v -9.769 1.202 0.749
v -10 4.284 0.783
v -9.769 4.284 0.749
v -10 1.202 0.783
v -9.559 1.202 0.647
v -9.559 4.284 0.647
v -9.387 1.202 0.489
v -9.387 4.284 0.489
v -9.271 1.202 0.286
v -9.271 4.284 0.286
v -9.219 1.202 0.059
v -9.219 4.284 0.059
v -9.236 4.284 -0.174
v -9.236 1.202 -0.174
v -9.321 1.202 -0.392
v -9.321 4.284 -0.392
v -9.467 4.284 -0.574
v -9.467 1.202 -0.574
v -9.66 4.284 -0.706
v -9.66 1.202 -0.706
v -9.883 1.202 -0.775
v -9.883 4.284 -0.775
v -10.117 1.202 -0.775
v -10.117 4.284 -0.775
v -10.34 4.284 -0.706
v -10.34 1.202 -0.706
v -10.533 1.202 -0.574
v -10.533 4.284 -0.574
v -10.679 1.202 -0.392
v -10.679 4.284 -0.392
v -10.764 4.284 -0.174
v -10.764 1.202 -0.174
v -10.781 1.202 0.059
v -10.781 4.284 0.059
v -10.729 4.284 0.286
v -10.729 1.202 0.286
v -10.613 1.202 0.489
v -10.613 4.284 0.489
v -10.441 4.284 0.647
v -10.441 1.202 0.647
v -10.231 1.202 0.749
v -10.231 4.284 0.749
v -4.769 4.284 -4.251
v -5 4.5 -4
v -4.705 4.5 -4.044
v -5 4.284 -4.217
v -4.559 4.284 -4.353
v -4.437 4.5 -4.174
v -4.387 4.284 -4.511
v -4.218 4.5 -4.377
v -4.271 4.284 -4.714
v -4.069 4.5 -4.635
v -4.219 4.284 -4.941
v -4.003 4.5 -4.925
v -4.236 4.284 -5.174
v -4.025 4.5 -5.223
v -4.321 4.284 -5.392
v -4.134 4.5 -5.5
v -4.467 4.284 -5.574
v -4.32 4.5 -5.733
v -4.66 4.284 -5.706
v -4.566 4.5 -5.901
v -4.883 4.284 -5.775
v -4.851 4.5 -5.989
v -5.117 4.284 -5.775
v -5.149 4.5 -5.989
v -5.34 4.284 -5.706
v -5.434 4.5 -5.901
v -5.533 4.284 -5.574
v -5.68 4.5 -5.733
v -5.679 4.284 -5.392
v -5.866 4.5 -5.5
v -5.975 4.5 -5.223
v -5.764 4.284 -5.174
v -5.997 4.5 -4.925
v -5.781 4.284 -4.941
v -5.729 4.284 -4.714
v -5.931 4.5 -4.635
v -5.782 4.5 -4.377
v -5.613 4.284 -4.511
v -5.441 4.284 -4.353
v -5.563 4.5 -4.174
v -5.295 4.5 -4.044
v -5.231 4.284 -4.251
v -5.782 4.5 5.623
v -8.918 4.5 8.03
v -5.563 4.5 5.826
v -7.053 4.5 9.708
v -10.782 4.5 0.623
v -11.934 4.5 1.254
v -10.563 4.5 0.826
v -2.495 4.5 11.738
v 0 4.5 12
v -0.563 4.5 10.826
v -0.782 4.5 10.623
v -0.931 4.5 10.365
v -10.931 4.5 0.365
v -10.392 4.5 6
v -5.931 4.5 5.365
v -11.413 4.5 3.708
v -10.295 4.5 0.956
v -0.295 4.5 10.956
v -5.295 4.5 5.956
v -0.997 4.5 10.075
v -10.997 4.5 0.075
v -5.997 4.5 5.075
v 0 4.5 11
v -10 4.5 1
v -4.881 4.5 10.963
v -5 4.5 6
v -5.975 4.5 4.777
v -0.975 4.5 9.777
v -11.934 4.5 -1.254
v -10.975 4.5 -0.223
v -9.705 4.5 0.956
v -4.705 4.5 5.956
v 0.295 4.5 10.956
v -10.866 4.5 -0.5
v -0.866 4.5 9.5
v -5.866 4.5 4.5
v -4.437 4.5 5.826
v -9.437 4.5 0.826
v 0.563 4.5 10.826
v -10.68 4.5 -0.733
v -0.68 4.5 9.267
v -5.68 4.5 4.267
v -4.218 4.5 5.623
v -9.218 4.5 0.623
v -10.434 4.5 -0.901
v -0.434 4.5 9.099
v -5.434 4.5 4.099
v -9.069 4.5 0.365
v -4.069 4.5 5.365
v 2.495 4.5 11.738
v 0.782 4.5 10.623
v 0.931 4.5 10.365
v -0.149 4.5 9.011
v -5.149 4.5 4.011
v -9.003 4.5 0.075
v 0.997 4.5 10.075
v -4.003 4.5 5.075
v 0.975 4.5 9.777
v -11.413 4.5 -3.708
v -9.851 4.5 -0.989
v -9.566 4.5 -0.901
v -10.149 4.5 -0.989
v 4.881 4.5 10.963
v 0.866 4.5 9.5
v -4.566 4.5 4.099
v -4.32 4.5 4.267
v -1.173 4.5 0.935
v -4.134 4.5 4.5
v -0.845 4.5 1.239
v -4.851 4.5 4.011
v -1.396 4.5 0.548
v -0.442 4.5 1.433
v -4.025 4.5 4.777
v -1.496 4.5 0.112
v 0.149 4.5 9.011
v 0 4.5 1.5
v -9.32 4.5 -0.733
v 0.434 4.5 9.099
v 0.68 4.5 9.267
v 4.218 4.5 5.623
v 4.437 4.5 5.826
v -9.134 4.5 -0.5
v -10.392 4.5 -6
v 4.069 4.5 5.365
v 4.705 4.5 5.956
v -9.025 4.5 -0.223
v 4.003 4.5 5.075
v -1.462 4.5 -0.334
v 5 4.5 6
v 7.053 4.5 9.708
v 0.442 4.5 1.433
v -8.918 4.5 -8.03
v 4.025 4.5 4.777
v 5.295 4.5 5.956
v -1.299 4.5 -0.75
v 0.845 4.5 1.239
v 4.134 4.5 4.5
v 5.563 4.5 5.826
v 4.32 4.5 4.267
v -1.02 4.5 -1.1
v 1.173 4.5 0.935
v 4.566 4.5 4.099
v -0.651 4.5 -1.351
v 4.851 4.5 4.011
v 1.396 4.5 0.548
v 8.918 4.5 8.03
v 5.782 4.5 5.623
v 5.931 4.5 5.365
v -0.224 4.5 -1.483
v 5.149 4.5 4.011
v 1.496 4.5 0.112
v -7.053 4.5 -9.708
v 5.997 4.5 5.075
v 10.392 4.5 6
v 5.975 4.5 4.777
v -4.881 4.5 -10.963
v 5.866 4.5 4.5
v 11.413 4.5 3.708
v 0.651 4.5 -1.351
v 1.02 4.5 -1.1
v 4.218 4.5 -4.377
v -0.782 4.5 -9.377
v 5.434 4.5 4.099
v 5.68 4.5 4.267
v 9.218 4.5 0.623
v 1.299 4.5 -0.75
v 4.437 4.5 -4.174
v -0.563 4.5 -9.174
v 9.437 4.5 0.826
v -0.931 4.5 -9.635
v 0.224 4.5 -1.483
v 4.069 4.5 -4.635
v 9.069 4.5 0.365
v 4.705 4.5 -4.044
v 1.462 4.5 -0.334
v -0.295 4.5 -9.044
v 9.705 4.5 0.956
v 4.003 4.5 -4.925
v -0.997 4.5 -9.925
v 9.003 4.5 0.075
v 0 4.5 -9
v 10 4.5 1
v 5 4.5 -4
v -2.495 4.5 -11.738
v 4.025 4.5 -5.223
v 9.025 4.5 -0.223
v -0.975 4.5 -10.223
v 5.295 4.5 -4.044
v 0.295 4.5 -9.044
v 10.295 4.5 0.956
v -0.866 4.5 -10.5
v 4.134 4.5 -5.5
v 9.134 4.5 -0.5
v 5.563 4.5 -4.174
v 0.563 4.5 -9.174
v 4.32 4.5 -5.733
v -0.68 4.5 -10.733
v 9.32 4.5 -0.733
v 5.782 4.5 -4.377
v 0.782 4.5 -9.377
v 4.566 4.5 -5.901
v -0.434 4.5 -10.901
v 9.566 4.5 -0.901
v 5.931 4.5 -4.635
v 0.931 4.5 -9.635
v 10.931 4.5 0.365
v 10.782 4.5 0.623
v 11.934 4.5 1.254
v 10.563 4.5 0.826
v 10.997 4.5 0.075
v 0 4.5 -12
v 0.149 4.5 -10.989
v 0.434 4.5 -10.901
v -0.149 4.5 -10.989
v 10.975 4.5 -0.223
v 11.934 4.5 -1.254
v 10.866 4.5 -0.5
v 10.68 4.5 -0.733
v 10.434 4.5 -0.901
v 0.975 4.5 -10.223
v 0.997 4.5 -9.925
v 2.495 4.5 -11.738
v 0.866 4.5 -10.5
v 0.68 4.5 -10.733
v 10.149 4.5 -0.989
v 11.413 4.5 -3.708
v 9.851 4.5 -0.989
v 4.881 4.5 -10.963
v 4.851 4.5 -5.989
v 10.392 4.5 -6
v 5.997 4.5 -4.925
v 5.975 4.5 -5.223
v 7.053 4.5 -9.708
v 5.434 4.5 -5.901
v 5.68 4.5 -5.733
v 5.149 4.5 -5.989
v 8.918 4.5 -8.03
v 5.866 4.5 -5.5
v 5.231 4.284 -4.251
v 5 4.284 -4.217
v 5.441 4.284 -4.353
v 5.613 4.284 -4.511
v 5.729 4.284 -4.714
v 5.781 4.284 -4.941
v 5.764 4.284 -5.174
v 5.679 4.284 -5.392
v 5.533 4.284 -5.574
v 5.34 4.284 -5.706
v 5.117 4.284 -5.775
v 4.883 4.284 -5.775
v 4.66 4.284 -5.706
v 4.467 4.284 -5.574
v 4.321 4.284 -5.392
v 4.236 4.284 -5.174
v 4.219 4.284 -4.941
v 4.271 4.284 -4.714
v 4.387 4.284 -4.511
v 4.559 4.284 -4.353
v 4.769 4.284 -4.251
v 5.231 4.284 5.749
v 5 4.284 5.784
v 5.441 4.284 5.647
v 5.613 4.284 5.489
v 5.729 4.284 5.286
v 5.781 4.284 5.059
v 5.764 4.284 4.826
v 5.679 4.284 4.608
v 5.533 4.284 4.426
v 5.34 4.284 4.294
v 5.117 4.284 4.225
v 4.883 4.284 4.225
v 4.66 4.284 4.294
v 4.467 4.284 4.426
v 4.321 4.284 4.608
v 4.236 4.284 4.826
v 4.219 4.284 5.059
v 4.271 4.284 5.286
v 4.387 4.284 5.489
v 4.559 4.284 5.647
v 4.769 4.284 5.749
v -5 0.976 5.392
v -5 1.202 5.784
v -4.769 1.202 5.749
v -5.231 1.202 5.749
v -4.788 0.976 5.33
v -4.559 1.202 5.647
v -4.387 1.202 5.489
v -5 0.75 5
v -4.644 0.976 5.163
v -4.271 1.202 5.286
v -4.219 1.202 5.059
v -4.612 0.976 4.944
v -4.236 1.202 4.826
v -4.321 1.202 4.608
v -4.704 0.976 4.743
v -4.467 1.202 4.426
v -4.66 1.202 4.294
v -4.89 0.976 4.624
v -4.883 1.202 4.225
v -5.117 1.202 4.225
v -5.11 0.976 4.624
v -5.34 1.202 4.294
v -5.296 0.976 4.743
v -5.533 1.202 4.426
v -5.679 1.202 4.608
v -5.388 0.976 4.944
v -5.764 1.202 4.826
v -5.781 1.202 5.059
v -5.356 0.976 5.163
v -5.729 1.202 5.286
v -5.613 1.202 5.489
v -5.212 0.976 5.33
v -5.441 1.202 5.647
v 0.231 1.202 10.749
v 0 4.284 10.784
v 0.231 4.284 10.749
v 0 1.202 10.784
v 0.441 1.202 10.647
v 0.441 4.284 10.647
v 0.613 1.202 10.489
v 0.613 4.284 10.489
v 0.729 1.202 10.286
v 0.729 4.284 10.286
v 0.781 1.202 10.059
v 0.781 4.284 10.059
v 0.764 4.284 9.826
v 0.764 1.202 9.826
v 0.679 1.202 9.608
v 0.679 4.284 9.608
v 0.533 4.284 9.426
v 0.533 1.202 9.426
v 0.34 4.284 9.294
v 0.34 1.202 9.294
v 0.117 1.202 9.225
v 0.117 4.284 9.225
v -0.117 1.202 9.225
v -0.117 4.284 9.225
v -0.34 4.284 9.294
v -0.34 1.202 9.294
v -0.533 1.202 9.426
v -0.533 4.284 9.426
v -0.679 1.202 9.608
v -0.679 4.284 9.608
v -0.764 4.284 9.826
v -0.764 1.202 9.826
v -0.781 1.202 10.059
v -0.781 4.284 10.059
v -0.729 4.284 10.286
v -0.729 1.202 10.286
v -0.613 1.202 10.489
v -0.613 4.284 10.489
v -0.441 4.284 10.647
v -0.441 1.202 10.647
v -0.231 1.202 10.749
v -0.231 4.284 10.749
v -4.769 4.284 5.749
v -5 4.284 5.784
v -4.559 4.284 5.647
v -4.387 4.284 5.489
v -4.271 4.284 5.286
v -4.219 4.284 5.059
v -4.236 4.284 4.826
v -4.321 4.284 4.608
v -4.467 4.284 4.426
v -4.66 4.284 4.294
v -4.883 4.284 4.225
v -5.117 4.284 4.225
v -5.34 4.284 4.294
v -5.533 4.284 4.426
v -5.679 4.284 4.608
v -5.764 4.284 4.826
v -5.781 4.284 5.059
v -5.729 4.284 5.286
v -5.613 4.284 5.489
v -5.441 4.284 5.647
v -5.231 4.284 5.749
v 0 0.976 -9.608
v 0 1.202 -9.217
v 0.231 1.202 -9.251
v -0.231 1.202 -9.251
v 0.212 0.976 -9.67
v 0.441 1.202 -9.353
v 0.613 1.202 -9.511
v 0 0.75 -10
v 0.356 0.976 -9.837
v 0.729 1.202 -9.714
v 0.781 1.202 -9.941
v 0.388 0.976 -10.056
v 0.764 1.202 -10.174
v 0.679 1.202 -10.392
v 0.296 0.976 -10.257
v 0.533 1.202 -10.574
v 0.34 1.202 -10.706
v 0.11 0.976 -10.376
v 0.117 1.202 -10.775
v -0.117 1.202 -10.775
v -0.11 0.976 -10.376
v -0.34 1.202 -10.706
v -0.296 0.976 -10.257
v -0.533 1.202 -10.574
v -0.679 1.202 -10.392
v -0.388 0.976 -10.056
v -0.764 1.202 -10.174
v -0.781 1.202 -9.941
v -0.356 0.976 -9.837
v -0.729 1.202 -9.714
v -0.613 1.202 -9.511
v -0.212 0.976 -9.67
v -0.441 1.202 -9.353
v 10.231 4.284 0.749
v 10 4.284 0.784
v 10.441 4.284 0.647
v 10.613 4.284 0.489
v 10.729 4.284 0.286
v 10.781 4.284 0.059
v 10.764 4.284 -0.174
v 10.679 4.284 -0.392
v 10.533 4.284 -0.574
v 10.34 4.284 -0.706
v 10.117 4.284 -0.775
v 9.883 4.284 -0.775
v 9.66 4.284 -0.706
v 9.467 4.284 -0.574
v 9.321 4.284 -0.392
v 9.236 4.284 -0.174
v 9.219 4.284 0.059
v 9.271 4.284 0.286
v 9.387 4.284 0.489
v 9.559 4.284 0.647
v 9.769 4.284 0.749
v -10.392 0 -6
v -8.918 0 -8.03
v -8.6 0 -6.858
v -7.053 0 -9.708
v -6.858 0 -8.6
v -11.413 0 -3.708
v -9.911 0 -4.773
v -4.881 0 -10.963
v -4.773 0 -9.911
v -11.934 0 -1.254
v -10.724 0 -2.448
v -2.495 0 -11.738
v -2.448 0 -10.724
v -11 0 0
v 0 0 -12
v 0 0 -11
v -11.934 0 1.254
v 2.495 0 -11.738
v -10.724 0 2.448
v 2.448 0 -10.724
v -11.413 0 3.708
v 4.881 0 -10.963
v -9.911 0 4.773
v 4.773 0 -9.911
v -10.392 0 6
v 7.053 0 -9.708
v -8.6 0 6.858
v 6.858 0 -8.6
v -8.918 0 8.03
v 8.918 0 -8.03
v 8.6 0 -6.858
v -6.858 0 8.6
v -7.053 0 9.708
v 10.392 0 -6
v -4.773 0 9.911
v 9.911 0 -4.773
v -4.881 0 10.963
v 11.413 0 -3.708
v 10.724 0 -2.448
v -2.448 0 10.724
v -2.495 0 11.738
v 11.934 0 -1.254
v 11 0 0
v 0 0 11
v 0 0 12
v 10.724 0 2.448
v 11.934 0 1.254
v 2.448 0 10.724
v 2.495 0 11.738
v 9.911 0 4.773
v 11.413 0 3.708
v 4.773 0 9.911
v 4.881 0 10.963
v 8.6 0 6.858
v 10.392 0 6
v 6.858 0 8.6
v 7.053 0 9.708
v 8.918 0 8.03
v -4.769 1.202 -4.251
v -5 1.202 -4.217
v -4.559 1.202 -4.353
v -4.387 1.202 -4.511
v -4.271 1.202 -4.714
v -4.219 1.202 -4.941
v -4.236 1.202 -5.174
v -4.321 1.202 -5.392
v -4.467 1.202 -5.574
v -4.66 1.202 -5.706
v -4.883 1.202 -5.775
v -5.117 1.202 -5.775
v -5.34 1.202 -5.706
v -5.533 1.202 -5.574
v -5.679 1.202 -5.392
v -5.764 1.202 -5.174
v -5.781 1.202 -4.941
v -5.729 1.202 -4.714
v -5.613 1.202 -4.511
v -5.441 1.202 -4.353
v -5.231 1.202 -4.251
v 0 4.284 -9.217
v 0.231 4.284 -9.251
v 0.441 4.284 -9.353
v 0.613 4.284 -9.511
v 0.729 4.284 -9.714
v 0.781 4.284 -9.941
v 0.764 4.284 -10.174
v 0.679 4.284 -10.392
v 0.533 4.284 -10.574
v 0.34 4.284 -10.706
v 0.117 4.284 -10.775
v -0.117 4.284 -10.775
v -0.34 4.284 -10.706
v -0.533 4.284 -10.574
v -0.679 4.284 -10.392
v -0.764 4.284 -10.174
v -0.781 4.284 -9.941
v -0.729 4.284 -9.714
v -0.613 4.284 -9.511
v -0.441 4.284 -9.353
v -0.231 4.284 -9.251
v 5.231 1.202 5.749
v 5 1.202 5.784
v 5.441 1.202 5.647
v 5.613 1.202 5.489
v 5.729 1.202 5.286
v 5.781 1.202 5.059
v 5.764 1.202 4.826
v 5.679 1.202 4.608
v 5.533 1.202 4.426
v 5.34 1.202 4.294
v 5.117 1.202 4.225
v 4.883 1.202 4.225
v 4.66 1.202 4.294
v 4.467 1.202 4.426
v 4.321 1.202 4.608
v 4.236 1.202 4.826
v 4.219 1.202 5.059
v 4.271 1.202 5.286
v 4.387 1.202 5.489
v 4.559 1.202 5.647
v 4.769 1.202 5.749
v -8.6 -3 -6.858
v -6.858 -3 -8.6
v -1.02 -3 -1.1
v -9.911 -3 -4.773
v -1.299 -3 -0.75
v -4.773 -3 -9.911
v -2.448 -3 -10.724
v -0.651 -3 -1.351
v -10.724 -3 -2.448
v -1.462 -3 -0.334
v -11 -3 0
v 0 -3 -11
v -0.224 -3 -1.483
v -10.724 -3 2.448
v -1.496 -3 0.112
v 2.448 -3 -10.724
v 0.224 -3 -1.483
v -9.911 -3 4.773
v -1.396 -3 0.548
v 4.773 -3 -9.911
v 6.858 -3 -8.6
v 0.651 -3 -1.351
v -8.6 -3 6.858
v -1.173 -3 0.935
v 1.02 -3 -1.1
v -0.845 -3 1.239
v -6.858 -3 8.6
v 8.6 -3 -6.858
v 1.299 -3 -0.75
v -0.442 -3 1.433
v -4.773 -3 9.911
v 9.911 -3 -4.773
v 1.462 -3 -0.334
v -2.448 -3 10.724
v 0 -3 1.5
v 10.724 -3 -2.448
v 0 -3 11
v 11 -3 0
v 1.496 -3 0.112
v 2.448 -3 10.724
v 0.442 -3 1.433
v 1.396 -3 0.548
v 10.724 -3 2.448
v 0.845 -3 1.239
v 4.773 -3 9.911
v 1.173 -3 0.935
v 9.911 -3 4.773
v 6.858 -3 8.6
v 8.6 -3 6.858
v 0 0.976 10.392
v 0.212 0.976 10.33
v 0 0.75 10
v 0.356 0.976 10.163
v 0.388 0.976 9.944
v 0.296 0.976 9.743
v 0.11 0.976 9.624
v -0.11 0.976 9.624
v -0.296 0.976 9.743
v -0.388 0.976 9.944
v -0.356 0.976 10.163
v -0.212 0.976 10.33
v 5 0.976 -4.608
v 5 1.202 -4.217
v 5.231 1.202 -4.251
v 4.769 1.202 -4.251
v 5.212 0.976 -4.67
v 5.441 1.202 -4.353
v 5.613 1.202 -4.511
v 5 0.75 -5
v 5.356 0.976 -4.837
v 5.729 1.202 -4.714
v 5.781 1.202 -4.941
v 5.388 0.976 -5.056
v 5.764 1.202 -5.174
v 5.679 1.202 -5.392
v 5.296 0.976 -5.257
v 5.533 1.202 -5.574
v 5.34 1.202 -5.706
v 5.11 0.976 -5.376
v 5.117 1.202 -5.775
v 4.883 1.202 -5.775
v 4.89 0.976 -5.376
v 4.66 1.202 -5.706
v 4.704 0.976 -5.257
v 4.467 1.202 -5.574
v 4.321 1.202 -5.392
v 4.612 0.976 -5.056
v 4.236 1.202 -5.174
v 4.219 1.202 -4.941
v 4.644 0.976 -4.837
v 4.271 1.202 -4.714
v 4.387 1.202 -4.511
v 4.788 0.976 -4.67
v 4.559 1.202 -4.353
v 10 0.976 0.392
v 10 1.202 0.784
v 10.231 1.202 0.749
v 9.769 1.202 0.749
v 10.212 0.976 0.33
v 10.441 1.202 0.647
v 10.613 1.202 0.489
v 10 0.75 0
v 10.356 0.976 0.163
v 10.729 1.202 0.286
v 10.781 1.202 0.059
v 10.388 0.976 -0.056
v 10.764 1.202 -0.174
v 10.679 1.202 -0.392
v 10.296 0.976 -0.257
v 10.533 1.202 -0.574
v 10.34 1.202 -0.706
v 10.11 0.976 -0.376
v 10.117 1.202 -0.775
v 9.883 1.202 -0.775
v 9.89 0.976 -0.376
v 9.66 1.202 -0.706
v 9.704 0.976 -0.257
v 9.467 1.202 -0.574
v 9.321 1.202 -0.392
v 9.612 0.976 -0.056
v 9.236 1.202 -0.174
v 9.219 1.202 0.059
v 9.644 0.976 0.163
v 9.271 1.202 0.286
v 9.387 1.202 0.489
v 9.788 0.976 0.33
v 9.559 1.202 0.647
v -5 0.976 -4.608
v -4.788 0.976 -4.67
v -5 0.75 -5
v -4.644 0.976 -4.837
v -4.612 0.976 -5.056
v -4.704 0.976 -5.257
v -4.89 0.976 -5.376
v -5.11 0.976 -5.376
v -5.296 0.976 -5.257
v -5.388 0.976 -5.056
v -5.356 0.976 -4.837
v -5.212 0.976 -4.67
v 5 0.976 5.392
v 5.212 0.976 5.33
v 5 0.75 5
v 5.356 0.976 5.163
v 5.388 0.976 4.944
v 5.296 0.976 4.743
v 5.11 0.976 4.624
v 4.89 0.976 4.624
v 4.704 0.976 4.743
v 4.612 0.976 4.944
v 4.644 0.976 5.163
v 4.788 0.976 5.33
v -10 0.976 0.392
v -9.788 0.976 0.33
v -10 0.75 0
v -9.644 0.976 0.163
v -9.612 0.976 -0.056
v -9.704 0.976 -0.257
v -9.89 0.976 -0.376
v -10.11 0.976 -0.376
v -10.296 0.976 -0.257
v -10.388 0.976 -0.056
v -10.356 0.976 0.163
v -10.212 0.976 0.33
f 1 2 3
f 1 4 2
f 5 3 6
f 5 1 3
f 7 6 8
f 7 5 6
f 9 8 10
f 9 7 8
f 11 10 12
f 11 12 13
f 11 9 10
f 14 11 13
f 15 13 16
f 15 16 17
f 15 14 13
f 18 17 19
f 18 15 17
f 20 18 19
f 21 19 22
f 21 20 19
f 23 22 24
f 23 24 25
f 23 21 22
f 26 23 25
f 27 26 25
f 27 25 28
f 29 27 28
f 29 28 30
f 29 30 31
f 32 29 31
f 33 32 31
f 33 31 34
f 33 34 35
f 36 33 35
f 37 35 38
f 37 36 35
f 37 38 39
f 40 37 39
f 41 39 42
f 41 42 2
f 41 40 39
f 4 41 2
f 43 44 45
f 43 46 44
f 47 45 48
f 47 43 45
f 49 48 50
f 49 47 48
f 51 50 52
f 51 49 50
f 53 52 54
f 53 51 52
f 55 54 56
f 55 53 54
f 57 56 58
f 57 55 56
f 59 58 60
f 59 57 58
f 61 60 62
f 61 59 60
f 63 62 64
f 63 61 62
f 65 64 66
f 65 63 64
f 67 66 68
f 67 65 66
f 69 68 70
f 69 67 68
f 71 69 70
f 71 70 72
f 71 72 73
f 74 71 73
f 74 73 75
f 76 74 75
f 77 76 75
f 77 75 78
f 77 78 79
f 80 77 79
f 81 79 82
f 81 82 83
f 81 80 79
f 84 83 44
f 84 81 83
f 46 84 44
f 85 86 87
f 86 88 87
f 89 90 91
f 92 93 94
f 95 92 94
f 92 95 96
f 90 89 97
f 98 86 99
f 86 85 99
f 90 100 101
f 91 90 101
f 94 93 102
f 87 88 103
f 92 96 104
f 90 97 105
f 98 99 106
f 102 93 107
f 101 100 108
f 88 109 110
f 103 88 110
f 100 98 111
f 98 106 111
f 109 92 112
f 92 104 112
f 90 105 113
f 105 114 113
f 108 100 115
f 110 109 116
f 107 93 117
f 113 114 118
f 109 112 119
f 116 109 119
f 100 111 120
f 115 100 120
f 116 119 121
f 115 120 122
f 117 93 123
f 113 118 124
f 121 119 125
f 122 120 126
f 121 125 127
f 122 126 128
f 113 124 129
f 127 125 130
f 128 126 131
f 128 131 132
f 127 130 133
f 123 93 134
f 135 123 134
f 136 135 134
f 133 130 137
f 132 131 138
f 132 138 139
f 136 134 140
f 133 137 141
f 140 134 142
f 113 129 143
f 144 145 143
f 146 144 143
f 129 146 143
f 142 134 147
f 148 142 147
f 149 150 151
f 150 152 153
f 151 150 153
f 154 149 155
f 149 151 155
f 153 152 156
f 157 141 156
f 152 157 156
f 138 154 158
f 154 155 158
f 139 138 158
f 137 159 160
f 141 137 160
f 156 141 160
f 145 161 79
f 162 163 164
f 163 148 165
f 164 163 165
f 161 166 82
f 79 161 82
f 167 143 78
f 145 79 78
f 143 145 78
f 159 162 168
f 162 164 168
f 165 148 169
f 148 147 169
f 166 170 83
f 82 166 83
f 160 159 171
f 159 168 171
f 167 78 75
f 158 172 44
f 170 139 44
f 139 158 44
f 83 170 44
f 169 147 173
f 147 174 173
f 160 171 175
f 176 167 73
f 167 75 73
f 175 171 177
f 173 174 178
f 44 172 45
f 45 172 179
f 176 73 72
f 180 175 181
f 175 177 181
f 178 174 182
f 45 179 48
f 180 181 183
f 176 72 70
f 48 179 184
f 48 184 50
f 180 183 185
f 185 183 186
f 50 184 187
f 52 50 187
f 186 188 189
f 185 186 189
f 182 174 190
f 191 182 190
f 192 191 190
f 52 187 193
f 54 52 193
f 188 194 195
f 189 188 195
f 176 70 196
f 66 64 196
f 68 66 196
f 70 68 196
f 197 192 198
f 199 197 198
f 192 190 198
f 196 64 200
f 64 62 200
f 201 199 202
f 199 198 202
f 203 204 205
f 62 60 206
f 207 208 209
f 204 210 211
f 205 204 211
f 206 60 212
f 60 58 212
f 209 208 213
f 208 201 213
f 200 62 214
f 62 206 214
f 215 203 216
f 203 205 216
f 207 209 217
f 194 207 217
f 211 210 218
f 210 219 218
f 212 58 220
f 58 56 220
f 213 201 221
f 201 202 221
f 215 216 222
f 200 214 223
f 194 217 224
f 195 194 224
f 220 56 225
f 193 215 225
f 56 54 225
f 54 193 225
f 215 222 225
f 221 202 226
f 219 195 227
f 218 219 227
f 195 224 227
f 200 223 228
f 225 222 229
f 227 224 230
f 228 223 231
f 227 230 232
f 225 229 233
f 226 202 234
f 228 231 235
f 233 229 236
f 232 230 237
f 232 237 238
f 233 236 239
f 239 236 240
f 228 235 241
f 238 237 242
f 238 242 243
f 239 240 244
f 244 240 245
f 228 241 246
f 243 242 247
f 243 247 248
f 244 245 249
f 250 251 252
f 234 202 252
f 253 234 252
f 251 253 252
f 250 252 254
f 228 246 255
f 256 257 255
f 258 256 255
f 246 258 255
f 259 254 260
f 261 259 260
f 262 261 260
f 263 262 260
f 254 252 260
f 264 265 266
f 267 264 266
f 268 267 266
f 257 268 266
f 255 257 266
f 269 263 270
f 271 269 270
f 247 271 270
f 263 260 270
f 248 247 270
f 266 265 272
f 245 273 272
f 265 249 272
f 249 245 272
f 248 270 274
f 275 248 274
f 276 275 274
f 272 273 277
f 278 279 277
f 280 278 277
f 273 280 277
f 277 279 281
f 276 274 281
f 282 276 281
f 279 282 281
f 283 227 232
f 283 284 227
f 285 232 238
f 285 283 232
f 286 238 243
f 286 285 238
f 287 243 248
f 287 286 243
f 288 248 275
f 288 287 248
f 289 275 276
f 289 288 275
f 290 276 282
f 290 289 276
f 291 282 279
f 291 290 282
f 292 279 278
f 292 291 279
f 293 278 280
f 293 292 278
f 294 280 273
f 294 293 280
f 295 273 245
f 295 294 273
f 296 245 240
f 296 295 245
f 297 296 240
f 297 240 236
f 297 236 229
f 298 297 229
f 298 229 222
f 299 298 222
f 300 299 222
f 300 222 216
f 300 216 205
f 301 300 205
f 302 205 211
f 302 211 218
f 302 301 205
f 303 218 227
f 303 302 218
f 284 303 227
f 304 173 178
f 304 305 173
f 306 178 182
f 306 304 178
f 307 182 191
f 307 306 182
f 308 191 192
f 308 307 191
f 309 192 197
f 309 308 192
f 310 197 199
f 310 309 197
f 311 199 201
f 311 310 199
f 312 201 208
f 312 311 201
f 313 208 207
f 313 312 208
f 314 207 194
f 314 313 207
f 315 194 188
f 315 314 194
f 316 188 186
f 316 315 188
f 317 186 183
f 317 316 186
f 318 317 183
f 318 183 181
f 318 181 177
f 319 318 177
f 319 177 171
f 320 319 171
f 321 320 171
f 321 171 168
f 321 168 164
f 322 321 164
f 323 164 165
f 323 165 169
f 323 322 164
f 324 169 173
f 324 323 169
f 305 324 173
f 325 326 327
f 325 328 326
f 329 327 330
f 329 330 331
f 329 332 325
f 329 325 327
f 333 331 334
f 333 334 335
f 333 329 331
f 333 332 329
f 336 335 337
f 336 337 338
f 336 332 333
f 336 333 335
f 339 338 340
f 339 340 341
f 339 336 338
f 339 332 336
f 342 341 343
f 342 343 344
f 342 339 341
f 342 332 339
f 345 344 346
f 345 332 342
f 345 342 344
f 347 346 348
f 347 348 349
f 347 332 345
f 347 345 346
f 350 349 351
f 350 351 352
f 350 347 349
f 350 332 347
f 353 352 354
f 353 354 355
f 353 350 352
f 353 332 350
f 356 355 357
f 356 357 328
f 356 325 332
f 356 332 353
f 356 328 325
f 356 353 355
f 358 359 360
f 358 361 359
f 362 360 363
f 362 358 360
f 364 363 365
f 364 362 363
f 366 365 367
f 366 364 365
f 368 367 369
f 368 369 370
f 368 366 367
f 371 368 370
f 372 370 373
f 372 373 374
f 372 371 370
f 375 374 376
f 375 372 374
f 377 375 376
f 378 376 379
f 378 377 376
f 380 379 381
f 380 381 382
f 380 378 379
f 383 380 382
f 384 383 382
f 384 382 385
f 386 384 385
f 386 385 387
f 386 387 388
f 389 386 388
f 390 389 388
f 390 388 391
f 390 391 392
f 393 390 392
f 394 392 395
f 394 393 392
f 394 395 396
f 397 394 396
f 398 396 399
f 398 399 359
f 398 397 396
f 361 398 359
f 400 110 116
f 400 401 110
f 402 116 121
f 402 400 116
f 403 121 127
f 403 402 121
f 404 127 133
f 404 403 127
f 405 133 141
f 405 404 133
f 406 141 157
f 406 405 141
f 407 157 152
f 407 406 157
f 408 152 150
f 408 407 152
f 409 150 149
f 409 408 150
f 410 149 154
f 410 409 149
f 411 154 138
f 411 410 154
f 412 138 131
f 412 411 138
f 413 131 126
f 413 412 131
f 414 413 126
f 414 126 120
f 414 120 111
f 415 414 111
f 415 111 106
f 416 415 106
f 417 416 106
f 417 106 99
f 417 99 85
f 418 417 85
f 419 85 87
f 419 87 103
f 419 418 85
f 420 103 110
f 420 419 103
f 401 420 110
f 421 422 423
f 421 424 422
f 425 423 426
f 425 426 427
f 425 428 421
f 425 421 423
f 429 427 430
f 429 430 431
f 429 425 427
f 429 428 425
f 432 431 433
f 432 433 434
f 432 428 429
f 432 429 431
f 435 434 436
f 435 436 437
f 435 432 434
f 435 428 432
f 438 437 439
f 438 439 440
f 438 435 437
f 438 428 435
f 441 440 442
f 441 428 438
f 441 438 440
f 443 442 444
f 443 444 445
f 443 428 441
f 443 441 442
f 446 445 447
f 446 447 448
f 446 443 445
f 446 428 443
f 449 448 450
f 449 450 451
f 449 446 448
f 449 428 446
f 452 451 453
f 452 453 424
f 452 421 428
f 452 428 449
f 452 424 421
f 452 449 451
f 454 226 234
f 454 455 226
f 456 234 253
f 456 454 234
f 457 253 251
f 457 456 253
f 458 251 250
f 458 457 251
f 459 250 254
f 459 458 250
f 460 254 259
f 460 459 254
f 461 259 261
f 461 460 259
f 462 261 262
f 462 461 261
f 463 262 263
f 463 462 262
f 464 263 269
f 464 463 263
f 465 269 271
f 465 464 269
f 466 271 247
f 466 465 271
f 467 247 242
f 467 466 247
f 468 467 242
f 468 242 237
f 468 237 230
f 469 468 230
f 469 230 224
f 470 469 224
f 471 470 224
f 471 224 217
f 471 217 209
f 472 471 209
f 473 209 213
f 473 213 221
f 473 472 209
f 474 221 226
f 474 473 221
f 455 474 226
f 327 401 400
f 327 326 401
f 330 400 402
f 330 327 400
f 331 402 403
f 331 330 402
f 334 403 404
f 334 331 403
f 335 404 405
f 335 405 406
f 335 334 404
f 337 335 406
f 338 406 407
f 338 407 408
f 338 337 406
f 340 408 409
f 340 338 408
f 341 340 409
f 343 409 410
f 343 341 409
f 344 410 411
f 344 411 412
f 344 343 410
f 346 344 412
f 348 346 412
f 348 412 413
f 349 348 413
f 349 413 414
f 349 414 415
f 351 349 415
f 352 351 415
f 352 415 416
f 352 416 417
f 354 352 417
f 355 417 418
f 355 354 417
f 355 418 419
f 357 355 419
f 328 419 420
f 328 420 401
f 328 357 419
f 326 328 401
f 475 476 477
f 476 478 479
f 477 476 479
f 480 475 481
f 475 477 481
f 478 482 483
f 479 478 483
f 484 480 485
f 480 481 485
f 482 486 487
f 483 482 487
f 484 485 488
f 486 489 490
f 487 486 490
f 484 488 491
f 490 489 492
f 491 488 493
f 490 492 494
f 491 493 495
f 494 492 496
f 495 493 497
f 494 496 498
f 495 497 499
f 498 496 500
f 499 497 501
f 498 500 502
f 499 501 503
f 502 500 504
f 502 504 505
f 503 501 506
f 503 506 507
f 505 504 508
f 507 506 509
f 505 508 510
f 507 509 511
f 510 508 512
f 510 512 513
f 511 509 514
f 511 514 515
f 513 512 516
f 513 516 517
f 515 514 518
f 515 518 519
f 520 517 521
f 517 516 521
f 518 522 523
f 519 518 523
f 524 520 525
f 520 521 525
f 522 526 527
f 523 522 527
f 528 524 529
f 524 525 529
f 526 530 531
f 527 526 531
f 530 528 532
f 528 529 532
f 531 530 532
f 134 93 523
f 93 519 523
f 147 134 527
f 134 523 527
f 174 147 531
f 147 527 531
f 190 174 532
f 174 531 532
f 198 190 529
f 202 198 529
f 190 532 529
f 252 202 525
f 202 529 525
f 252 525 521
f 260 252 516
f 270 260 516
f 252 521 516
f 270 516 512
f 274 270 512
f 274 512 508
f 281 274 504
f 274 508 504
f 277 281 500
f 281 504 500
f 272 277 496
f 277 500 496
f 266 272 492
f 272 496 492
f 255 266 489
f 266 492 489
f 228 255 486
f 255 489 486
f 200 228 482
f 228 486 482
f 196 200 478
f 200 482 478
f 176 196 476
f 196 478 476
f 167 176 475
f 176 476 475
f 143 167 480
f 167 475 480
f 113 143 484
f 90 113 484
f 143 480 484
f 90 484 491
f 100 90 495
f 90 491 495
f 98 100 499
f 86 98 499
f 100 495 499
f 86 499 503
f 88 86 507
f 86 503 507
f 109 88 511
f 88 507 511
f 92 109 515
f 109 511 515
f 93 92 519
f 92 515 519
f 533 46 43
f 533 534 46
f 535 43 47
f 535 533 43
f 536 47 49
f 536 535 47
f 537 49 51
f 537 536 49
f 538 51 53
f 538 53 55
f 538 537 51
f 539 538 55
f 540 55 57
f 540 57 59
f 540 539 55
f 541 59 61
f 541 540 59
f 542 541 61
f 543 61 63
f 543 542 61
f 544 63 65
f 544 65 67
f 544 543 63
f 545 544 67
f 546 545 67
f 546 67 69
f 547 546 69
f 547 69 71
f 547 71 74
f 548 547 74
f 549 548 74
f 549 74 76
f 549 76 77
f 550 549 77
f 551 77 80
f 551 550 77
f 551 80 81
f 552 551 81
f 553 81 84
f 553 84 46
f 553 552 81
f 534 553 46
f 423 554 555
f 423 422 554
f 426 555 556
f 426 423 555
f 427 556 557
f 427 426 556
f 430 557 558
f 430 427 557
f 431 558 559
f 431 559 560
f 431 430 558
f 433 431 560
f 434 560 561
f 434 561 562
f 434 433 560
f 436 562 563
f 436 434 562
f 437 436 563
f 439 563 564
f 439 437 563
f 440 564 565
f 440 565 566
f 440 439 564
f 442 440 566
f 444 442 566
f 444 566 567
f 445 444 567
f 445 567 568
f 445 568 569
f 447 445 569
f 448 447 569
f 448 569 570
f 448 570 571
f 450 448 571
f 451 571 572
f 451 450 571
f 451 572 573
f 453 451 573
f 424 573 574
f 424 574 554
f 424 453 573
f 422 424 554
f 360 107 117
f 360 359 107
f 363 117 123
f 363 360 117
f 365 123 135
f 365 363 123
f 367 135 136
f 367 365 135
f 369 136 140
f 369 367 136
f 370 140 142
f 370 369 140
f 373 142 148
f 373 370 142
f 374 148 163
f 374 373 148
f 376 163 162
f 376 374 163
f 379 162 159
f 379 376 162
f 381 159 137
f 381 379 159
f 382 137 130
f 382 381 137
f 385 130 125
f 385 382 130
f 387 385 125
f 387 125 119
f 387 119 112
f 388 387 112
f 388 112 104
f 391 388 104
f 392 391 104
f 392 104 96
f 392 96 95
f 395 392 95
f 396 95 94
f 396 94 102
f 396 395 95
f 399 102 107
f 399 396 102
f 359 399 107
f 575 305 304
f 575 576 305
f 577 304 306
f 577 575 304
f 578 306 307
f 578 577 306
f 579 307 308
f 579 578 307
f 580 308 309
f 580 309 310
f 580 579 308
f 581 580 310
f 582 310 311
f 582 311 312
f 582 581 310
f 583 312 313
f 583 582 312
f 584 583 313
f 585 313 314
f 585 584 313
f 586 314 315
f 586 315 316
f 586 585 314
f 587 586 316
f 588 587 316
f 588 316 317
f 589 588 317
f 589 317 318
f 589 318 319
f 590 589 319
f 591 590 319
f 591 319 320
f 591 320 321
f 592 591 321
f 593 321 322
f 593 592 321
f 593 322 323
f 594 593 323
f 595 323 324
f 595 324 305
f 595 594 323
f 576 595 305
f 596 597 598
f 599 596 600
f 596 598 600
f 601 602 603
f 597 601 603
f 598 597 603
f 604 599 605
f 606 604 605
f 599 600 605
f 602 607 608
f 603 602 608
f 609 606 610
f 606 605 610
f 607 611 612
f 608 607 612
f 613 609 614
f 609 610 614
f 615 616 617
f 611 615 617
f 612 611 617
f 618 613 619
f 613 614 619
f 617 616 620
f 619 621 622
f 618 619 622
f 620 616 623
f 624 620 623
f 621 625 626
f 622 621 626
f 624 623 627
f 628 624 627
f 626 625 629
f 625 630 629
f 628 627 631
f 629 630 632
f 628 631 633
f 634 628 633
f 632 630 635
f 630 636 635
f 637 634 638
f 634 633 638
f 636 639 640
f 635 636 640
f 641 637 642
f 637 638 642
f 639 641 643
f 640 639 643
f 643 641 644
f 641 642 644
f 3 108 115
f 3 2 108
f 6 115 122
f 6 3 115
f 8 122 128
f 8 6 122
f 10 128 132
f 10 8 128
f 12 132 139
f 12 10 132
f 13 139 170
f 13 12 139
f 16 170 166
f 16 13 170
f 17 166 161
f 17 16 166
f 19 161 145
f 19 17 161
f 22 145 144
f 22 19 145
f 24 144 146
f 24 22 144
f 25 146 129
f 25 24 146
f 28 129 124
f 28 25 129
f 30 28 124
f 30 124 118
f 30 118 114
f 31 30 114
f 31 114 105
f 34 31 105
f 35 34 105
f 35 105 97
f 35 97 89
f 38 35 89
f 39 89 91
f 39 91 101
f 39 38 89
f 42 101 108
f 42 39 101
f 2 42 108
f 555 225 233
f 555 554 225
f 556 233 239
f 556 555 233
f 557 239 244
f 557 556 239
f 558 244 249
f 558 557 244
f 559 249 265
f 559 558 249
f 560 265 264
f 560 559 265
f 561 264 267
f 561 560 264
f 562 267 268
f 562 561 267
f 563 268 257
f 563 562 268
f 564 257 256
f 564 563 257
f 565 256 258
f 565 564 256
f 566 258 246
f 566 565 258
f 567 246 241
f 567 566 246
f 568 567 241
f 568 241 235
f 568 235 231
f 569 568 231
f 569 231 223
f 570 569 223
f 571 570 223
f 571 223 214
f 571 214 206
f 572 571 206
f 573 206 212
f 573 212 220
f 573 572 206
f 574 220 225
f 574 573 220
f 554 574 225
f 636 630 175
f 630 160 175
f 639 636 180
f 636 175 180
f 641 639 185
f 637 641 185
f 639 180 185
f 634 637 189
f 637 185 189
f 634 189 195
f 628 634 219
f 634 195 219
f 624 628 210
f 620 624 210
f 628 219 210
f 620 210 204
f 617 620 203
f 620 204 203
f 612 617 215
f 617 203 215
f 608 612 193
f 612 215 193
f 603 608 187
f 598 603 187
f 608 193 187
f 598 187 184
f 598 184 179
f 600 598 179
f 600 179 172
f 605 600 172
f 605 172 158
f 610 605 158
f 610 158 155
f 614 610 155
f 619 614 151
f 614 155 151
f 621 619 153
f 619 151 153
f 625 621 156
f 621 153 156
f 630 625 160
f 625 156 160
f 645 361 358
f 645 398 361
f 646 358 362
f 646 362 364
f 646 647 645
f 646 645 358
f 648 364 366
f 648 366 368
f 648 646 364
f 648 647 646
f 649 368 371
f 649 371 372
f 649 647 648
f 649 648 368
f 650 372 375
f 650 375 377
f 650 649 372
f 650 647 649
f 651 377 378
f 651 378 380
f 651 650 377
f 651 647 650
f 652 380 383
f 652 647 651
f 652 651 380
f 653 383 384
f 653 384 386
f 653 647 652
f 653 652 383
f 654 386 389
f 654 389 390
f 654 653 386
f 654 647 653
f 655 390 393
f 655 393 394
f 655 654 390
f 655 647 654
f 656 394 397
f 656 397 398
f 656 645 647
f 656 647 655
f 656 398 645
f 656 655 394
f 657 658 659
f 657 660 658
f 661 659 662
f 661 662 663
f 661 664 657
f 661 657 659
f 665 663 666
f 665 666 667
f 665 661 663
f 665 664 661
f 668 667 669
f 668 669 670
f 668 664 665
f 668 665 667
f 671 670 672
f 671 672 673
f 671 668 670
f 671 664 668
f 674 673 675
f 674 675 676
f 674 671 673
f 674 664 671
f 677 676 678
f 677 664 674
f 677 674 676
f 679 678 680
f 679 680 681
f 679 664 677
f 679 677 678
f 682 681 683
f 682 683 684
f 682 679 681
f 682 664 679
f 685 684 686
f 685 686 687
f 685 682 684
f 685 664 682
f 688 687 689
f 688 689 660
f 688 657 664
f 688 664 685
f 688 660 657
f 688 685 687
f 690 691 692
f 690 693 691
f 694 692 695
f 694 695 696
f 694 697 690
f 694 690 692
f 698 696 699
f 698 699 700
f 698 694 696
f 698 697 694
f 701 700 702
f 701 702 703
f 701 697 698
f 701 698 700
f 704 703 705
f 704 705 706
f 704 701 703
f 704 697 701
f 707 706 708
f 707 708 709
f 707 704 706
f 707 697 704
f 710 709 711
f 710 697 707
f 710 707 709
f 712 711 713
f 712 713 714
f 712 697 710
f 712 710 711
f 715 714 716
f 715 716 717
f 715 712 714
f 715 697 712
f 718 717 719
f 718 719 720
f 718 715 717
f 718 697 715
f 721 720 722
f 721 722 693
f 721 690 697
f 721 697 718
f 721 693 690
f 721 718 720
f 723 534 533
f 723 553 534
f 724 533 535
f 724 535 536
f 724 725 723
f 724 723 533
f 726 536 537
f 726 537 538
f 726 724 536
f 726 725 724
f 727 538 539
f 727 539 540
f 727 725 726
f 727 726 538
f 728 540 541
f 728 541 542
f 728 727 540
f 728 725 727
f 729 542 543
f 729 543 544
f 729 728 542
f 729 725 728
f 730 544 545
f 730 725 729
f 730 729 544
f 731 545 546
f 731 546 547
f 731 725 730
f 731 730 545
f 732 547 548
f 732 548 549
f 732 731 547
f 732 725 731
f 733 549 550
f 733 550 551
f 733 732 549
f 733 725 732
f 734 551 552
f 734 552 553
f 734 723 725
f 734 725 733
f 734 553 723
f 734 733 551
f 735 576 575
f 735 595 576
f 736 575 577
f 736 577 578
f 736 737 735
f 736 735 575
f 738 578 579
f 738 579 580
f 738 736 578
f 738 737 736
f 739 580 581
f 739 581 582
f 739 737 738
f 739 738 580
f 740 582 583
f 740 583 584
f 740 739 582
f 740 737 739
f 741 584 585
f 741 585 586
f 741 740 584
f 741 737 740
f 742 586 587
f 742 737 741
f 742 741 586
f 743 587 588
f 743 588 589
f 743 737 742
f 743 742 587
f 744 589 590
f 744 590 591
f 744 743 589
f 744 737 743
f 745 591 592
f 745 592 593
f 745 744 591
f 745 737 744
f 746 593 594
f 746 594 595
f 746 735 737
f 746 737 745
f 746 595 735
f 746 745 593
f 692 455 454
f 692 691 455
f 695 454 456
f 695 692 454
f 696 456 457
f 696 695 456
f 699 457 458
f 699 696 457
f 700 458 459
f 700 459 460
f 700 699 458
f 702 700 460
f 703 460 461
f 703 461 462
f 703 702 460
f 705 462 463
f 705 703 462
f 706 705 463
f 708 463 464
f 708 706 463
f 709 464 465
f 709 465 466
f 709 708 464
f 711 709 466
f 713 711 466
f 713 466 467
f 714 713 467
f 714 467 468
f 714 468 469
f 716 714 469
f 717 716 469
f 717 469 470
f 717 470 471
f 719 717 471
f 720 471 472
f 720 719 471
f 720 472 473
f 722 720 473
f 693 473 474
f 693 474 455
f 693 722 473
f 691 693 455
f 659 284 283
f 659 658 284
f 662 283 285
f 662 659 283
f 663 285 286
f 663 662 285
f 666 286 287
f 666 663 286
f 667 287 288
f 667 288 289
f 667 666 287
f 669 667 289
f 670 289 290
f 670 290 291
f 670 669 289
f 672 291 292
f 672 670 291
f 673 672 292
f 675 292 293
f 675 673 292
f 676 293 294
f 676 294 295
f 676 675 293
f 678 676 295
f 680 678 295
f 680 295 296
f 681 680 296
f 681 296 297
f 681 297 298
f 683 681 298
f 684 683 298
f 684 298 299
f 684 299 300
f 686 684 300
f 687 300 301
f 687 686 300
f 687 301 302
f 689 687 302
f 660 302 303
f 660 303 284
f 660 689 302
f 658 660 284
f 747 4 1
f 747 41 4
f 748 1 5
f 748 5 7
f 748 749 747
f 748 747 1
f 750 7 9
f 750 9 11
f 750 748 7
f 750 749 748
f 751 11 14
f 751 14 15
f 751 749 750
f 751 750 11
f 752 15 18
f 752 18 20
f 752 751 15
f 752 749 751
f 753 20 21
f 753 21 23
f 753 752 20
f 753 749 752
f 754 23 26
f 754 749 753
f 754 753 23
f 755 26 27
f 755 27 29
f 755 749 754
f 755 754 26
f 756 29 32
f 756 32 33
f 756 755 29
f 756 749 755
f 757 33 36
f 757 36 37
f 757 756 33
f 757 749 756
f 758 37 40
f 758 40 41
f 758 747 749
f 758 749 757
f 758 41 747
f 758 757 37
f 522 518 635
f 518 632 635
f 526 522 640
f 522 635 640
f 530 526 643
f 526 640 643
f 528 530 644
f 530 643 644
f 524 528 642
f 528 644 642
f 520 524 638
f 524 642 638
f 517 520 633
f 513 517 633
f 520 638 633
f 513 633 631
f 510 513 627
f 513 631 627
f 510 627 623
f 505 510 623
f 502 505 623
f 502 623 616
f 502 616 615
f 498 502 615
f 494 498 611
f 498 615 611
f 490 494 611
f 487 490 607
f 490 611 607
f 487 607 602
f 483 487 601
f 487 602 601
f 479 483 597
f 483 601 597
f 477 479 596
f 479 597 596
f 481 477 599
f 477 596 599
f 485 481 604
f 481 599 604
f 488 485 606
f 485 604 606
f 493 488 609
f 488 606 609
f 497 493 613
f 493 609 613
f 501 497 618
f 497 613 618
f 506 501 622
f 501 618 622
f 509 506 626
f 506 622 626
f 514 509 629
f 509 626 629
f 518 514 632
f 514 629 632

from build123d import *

# Parameters (mm, degrees)
SKETCH_2_W                  = 1.5
SKETCH_2_H                  = 15
PATTERN_LINEAR_1_COUNT      = 3
PATTERN_LINEAR_1_PITCH      = 7.071067812
PATTERN_LINEAR_1_COUNT_DIR2 = 3
PATTERN_LINEAR_1_PITCH_DIR2 = 7.071067812


with BuildPart() as part:
    # 草图1 → 旋转1 (revolve)
    with BuildSketch(Plane.XY):
        Polygon((0, 4.5), (12, 4.5), (12, 0), (11, 0), (11, -3), (0, -3), align=None)
    revolve(axis=Axis((0, -3, 0), (0, 1, 0)))

    # 草图2 → 切除-旋转1 (revolve, cut)
    with BuildSketch(Plane.XY):
        with Locations((0.75, -3)):
            Rectangle(SKETCH_2_W, SKETCH_2_H)
    revolve(axis=Axis((0, -10.5, 0), (0, 1, 0)), mode=Mode.SUBTRACT)

    # 草图3 → 切除-旋转2 (revolve, cut)
    with BuildSketch(Plane.XY):
        Polygon((10, 4.5), (11, 4.5), (10.7835, 4.2835), (10.7835, 1.202353936), (10, 0.75), align=None)
    cut_revolve_2 = revolve(axis=Axis((10, 0.75, 0), (0, 1, 0)), mode=Mode.SUBTRACT)

    # 阵列(线性)1: Cut-Revolve 2 3 × 3, 1 skipped
    with Locations(*[Vector(-0.7071067811865475, 0, -0.7071067811865476) * (i * PATTERN_LINEAR_1_PITCH) + Vector(-0.7071067811865477, 0, 0.7071067811865475) * (j * PATTERN_LINEAR_1_PITCH_DIR2) for i in range(PATTERN_LINEAR_1_COUNT) for j in range(PATTERN_LINEAR_1_COUNT_DIR2) if (i, j) not in ((0, 0), (1, 1))]):
        add(cut_revolve_2, mode=Mode.SUBTRACT)


solid = part.part
